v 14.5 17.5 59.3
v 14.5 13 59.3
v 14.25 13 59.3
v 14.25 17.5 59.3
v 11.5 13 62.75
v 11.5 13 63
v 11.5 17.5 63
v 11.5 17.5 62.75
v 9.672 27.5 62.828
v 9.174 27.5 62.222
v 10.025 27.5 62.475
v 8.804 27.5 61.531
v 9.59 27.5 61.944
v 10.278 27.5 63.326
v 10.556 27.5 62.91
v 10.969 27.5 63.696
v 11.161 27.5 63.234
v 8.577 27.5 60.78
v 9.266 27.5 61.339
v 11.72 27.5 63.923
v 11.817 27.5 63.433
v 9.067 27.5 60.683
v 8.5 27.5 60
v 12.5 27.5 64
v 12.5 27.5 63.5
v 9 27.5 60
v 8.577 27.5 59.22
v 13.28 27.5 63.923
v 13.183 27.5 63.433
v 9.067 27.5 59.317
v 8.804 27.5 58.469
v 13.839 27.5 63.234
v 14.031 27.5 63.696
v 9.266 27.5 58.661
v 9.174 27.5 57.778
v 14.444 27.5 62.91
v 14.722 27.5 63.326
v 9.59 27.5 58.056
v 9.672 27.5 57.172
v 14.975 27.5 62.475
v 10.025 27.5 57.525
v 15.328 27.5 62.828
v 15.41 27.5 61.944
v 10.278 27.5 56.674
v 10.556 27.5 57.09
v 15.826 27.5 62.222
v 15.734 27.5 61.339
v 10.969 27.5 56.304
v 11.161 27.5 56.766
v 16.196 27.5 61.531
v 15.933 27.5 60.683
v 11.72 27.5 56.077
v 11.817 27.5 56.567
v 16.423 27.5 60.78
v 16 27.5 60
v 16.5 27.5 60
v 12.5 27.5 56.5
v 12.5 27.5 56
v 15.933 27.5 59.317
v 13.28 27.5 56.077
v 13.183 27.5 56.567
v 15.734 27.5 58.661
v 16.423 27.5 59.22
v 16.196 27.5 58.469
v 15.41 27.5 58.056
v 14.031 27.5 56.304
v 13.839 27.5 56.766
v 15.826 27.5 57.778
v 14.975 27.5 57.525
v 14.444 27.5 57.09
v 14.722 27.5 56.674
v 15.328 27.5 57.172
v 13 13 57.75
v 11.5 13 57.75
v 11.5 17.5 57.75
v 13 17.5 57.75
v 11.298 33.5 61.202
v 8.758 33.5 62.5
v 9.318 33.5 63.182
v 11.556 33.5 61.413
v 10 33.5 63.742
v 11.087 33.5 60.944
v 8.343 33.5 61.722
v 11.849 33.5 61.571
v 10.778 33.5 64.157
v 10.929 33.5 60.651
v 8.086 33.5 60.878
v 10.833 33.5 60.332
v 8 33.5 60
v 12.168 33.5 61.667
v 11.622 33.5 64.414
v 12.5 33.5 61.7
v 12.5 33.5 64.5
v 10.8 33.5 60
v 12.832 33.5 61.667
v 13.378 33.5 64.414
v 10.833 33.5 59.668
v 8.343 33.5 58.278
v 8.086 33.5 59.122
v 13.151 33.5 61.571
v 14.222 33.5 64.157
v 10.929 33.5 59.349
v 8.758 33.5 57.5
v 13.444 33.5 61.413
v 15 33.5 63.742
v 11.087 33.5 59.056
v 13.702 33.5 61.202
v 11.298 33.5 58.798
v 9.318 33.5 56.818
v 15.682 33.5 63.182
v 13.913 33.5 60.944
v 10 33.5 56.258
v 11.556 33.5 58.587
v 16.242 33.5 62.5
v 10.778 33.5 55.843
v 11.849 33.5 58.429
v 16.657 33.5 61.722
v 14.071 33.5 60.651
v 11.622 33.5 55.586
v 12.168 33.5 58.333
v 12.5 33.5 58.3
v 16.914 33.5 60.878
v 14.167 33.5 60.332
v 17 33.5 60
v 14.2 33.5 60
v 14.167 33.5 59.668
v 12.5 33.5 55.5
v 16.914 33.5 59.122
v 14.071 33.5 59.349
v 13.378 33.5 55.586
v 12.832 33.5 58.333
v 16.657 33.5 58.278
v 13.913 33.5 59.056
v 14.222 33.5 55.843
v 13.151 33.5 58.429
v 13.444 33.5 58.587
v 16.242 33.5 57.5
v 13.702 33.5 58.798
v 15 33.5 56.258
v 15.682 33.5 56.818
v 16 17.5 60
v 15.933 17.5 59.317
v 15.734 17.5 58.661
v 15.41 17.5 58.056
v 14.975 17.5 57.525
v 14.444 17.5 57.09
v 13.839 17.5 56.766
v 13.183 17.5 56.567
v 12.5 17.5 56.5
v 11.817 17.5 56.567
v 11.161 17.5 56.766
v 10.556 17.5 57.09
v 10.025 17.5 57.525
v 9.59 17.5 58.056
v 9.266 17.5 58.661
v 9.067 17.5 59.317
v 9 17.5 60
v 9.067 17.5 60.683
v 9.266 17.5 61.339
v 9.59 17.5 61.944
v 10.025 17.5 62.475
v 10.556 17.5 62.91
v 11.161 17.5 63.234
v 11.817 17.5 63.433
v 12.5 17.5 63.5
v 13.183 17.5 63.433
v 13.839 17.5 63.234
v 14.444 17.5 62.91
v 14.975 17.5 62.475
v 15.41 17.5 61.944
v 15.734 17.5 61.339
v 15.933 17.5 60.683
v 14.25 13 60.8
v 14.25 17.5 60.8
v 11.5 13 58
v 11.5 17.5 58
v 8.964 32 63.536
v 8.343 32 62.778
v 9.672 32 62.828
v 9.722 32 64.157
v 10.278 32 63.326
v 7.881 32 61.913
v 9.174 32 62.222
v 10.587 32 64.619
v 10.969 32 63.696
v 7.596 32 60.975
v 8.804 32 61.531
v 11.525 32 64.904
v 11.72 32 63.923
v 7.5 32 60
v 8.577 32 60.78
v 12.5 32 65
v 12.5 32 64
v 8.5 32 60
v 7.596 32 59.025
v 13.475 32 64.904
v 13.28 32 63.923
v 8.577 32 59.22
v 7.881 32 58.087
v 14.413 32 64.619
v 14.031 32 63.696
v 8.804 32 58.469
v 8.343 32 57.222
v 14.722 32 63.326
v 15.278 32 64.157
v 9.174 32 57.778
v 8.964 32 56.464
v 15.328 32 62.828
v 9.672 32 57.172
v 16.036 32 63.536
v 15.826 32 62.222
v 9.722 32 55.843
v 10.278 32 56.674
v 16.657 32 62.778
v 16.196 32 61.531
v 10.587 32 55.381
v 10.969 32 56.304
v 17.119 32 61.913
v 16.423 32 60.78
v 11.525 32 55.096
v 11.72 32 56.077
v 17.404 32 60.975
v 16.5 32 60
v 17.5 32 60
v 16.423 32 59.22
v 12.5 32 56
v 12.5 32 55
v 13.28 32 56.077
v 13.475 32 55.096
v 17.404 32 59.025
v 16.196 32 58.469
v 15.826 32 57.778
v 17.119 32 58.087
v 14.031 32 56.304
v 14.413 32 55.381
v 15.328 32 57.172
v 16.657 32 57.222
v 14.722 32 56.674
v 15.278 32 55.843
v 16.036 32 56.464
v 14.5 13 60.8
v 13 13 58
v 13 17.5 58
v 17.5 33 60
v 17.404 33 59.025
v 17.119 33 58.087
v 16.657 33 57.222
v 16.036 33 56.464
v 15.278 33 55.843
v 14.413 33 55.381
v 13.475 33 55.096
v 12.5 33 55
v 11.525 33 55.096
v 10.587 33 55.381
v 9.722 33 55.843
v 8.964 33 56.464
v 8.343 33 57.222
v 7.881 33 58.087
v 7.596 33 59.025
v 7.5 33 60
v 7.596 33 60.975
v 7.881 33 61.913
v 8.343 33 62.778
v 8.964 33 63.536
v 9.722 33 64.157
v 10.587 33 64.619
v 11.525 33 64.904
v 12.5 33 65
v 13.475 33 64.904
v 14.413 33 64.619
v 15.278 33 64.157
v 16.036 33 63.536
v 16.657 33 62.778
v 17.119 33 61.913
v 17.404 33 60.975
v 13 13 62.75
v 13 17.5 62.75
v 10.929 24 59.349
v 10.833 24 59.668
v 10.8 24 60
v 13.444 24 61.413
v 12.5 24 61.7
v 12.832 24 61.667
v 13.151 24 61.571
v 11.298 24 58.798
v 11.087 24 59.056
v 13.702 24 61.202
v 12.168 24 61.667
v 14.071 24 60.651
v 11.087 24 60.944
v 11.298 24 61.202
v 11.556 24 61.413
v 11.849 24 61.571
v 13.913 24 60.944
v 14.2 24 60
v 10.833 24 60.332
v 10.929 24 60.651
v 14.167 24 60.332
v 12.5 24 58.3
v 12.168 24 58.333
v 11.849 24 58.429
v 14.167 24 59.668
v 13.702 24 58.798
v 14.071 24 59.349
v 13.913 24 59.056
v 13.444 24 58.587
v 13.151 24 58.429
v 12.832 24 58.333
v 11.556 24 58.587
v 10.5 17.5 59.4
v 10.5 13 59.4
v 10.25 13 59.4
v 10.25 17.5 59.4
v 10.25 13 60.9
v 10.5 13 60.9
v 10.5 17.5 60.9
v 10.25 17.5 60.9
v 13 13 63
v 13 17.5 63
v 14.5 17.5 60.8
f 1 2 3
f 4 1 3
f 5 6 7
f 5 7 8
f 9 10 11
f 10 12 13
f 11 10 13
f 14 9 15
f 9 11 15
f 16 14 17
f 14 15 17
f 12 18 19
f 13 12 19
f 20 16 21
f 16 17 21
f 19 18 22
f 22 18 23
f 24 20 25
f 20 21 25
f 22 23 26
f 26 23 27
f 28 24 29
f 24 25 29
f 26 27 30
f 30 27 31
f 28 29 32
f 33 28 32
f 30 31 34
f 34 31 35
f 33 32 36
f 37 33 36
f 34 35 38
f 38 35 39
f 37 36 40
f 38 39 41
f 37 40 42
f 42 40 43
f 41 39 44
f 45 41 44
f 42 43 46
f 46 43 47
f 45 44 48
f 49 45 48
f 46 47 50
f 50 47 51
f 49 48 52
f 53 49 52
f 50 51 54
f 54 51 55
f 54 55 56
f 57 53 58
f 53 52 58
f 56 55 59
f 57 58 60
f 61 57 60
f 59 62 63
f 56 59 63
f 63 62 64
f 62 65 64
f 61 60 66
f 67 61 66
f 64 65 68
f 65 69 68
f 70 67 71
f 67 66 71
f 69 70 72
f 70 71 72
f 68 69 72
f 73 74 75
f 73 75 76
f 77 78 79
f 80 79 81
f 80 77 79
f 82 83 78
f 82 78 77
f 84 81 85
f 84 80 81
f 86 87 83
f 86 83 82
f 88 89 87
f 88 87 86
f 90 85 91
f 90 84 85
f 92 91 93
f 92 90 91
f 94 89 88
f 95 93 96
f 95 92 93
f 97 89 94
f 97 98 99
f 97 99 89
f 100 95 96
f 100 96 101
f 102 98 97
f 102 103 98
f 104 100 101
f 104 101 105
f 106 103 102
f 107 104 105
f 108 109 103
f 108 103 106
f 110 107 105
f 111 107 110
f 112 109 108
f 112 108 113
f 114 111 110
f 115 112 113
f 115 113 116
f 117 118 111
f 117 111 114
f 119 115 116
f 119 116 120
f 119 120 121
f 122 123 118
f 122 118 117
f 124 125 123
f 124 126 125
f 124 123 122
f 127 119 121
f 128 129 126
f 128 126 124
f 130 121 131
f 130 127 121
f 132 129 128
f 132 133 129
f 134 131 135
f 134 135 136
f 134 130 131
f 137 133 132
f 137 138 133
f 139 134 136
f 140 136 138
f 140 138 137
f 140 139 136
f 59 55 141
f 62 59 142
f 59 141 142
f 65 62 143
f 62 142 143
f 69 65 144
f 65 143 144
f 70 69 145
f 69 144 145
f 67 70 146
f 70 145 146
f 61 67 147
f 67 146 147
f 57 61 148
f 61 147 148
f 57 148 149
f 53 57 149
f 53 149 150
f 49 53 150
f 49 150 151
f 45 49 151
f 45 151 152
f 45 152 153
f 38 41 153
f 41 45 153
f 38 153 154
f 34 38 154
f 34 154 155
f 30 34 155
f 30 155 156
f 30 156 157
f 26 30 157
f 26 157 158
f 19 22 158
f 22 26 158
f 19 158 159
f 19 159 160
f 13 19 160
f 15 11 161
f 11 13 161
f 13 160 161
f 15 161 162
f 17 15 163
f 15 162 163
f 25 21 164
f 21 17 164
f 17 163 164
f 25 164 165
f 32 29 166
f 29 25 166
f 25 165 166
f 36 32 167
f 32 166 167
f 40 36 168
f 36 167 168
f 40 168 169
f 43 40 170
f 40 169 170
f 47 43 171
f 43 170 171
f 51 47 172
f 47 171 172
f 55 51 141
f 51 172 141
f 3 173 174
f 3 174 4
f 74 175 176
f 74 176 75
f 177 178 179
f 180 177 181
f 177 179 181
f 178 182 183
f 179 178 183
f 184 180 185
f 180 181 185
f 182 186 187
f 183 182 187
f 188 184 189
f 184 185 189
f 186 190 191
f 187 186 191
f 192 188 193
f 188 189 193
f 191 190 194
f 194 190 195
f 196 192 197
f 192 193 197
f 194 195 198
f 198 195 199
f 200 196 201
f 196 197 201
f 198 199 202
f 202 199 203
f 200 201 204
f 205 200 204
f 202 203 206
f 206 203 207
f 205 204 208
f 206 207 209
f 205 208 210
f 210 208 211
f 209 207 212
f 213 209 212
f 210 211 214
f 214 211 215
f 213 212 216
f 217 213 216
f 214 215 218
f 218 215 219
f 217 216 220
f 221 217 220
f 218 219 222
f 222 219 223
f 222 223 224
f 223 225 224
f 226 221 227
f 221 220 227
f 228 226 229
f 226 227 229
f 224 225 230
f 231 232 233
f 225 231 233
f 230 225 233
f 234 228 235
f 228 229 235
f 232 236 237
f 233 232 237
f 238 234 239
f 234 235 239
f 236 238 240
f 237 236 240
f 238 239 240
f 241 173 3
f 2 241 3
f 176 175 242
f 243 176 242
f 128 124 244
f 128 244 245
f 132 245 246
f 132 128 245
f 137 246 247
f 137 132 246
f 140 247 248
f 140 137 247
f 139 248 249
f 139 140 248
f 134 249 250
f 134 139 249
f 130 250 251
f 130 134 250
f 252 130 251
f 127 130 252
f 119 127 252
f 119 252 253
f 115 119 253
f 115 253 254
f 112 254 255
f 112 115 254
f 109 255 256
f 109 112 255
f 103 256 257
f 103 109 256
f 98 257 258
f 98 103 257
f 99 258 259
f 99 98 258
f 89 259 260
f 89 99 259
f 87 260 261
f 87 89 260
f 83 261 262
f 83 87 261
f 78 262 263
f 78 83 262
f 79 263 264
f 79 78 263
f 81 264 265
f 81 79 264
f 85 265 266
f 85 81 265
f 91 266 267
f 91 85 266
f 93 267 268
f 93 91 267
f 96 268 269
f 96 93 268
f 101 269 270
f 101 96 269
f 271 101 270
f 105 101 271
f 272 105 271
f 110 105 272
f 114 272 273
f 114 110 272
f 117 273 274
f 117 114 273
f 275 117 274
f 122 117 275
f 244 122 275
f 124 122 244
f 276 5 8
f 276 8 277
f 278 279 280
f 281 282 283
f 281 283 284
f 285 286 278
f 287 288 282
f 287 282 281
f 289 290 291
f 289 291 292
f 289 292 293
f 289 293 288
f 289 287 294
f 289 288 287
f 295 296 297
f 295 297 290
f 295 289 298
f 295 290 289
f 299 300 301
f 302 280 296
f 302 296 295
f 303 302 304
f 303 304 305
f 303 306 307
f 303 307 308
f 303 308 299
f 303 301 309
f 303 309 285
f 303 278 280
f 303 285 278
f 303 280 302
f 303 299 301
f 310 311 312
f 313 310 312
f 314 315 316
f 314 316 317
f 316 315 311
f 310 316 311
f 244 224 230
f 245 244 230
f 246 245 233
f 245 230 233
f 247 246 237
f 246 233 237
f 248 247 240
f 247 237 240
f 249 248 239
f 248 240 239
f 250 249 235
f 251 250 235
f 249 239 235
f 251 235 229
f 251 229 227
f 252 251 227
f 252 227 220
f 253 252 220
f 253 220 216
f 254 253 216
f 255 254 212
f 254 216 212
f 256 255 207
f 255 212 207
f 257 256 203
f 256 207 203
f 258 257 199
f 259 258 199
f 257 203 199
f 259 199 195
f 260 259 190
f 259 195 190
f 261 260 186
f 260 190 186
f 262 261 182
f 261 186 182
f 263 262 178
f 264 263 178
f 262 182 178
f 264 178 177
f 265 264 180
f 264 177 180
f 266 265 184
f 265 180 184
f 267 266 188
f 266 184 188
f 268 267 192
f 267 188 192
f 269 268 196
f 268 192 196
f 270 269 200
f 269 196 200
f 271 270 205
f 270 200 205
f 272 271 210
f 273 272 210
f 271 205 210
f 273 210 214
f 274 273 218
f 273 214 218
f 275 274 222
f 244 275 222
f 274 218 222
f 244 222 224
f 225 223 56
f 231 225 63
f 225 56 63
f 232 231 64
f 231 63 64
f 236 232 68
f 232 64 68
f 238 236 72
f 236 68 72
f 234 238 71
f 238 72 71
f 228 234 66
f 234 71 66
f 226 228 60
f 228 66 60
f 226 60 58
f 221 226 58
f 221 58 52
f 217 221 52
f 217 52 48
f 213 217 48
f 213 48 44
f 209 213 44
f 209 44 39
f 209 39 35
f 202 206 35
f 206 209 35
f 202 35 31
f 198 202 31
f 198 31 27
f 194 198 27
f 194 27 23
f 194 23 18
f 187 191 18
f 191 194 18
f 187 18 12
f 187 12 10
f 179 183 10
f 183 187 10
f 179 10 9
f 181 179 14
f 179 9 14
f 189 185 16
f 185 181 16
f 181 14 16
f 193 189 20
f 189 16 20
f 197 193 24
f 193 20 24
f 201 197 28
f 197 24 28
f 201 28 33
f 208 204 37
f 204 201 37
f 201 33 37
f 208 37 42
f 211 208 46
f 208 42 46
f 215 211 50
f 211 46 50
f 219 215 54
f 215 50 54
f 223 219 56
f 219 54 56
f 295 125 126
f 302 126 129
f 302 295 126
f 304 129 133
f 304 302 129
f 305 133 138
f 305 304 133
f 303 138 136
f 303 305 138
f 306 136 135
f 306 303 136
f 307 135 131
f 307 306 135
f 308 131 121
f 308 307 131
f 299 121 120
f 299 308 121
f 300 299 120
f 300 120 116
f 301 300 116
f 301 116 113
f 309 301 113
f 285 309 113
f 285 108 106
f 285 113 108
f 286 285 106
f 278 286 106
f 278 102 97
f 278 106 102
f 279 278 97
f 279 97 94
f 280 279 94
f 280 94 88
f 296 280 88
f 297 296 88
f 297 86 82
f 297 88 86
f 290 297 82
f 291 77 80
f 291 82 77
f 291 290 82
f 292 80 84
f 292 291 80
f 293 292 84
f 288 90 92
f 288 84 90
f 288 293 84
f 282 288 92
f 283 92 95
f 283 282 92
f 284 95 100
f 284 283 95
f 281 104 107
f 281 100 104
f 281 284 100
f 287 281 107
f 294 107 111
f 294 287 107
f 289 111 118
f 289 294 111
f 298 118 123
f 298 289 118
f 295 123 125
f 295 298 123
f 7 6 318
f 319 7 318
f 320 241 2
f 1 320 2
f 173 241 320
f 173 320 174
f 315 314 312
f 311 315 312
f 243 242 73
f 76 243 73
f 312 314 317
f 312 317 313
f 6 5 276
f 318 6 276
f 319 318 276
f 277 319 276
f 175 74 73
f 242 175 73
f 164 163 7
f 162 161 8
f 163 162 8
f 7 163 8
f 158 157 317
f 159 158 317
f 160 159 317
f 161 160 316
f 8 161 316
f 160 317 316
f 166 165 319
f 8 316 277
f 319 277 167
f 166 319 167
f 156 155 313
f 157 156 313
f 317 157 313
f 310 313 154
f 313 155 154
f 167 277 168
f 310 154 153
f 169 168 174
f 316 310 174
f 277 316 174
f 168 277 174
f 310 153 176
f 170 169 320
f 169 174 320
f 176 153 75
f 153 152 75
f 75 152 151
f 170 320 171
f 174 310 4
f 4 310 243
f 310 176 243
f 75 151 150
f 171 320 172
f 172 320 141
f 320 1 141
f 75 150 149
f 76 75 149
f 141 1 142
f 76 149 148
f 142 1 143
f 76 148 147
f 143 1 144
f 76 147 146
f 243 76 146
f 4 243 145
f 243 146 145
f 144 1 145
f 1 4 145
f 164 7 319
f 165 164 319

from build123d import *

# Parameters (mm, degrees)
CYLINDER003005_R          = 1.7
CYLINDER003005_DEPTH      = 10
CYLINDER002010_R          = 3.5
CYLINDER002010_DEPTH      = 16
BOX001001007_W            = 1.5
BOX001001007_H            = 0.25
BOX001001007_DEPTH        = 4.6
BOX001001008_W            = 1.5
BOX001001008_H            = 0.25
BOX001001008_DEPTH        = 4.6
BOX001001_W               = 1.5
BOX001001_H               = 0.25
BOX001001_DEPTH           = 4.6
BOX001001_PLACEMENT_ANGLE = 90
BOX001002_W               = 1.5
BOX001002_H               = 0.25
BOX001002_DEPTH           = 4.6
BOX001002_PLACEMENT_ANGLE = 90
CYLINDER004013_R          = 5
CYLINDER004013_DEPTH      = 1.5
CHAMFER009_SIZE           = 0.5
CYLINDER001009_R          = 4
CYLINDER001009_DEPTH      = 4.6
CUT003013_ROLL_ANGLE      = -90


with BuildPart() as hole:
    # Cylinder003005 → Cylinder003005 (new body)
    with BuildSketch(Plane.XY.offset(-8)):
        Circle(CYLINDER003005_R)
    extrude(amount=CYLINDER003005_DEPTH)


with BuildPart() as cylinder002010:
    # Cylinder002010 → Cylinder002010 (new body)
    with BuildSketch(Plane.XY.offset(-14.5)):
        Circle(CYLINDER002010_R)
    extrude(amount=CYLINDER002010_DEPTH)


with BuildPart() as contact:
    # Box001001007 → Box001001007 (new body)
    with BuildSketch(Plane(origin=(-1, -3, -19), x_dir=(1, 0, 0), z_dir=(0, 0, 1))):
        with Locations((0.75, 0.125)):
            Rectangle(BOX001001007_W, BOX001001007_H)
    extrude(amount=BOX001001007_DEPTH)


with BuildPart() as contact001:
    # Box001001008 → Box001001008 (new body)
    with BuildSketch(Plane(origin=(-1, 2, -19), x_dir=(1, 0, 0), z_dir=(0, 0, 1))):
        with Locations((0.75, 0.125)):
            Rectangle(BOX001001008_W, BOX001001008_H)
    extrude(amount=BOX001001008_DEPTH)


with BuildPart() as contact002:
    # Box001001 → Box001001 (new body)
    with BuildSketch(Plane.XY):
        with Locations((0.75, 0.125)):
            Rectangle(BOX001001_W, BOX001001_H)
    extrude(amount=BOX001001_DEPTH)


with BuildPart() as contact002_1:
    # Box001001 placement: moved
    add(contact002.part.moved(Location((2, -0.8, -19))).rotate(Axis((2, -0.8, -19), (0, 0, 1)), BOX001001_PLACEMENT_ANGLE))


with BuildPart() as contact003:
    # Box001002 → Box001002 (new body)
    with BuildSketch(Plane.XY):
        with Locations((0.75, 0.125)):
            Rectangle(BOX001002_W, BOX001002_H)
    extrude(amount=BOX001002_DEPTH)


with BuildPart() as contact003_1:
    # Box001002 placement: moved
    add(contact003.part.moved(Location((-2, -0.9, -19))).rotate(Axis((-2, -0.9, -19), (0, 0, 1)), BOX001002_PLACEMENT_ANGLE))


with BuildPart() as chamfer009:
    # Cylinder004013 → Cylinder004013 (new body)
    with BuildSketch(Plane.XY):
        Circle(CYLINDER004013_R)
    extrude(amount=CYLINDER004013_DEPTH)

    # Chamfer009
    chamfer009_edges = [chamfer009.edges().sort_by_distance(p)[0] for p in [
        (-5, 0, 1.5),
    ]]
    chamfer(chamfer009_edges, length=CHAMFER009_SIZE)


with BuildPart() as f_4_way_jack_socket:
    # Cylinder001009 → Cylinder001009 (new body)
    with BuildSketch(Plane.XY.offset(-4.5)):
        Circle(CYLINDER001009_R)
    extrude(amount=CYLINDER001009_DEPTH)

    # Fusion001002: union Cylinder002010, Contact, Contact001, Contact002, Contact003, Chamfer009
    add(cylinder002010.part)
    add(contact.part)
    add(contact001.part)
    add(contact002_1.part)
    add(contact003_1.part)
    add(chamfer009.part)

    # Cut003013: cut hole
    add(hole.part, mode=Mode.SUBTRACT)


with BuildPart() as f_4_way_jack_socket_1:
    # Cut003013 roll: moved
    add(f_4_way_jack_socket.part.rotate(Axis((0, 0, 0), (1, 0, 0)), CUT003013_ROLL_ANGLE))


with BuildPart() as f_4_way_jack_socket_2:
    # Cut003013 placement: moved
    add(f_4_way_jack_socket_1.part.moved(Location((12.5, 32, 60))))


solid = f_4_way_jack_socket_2.part
